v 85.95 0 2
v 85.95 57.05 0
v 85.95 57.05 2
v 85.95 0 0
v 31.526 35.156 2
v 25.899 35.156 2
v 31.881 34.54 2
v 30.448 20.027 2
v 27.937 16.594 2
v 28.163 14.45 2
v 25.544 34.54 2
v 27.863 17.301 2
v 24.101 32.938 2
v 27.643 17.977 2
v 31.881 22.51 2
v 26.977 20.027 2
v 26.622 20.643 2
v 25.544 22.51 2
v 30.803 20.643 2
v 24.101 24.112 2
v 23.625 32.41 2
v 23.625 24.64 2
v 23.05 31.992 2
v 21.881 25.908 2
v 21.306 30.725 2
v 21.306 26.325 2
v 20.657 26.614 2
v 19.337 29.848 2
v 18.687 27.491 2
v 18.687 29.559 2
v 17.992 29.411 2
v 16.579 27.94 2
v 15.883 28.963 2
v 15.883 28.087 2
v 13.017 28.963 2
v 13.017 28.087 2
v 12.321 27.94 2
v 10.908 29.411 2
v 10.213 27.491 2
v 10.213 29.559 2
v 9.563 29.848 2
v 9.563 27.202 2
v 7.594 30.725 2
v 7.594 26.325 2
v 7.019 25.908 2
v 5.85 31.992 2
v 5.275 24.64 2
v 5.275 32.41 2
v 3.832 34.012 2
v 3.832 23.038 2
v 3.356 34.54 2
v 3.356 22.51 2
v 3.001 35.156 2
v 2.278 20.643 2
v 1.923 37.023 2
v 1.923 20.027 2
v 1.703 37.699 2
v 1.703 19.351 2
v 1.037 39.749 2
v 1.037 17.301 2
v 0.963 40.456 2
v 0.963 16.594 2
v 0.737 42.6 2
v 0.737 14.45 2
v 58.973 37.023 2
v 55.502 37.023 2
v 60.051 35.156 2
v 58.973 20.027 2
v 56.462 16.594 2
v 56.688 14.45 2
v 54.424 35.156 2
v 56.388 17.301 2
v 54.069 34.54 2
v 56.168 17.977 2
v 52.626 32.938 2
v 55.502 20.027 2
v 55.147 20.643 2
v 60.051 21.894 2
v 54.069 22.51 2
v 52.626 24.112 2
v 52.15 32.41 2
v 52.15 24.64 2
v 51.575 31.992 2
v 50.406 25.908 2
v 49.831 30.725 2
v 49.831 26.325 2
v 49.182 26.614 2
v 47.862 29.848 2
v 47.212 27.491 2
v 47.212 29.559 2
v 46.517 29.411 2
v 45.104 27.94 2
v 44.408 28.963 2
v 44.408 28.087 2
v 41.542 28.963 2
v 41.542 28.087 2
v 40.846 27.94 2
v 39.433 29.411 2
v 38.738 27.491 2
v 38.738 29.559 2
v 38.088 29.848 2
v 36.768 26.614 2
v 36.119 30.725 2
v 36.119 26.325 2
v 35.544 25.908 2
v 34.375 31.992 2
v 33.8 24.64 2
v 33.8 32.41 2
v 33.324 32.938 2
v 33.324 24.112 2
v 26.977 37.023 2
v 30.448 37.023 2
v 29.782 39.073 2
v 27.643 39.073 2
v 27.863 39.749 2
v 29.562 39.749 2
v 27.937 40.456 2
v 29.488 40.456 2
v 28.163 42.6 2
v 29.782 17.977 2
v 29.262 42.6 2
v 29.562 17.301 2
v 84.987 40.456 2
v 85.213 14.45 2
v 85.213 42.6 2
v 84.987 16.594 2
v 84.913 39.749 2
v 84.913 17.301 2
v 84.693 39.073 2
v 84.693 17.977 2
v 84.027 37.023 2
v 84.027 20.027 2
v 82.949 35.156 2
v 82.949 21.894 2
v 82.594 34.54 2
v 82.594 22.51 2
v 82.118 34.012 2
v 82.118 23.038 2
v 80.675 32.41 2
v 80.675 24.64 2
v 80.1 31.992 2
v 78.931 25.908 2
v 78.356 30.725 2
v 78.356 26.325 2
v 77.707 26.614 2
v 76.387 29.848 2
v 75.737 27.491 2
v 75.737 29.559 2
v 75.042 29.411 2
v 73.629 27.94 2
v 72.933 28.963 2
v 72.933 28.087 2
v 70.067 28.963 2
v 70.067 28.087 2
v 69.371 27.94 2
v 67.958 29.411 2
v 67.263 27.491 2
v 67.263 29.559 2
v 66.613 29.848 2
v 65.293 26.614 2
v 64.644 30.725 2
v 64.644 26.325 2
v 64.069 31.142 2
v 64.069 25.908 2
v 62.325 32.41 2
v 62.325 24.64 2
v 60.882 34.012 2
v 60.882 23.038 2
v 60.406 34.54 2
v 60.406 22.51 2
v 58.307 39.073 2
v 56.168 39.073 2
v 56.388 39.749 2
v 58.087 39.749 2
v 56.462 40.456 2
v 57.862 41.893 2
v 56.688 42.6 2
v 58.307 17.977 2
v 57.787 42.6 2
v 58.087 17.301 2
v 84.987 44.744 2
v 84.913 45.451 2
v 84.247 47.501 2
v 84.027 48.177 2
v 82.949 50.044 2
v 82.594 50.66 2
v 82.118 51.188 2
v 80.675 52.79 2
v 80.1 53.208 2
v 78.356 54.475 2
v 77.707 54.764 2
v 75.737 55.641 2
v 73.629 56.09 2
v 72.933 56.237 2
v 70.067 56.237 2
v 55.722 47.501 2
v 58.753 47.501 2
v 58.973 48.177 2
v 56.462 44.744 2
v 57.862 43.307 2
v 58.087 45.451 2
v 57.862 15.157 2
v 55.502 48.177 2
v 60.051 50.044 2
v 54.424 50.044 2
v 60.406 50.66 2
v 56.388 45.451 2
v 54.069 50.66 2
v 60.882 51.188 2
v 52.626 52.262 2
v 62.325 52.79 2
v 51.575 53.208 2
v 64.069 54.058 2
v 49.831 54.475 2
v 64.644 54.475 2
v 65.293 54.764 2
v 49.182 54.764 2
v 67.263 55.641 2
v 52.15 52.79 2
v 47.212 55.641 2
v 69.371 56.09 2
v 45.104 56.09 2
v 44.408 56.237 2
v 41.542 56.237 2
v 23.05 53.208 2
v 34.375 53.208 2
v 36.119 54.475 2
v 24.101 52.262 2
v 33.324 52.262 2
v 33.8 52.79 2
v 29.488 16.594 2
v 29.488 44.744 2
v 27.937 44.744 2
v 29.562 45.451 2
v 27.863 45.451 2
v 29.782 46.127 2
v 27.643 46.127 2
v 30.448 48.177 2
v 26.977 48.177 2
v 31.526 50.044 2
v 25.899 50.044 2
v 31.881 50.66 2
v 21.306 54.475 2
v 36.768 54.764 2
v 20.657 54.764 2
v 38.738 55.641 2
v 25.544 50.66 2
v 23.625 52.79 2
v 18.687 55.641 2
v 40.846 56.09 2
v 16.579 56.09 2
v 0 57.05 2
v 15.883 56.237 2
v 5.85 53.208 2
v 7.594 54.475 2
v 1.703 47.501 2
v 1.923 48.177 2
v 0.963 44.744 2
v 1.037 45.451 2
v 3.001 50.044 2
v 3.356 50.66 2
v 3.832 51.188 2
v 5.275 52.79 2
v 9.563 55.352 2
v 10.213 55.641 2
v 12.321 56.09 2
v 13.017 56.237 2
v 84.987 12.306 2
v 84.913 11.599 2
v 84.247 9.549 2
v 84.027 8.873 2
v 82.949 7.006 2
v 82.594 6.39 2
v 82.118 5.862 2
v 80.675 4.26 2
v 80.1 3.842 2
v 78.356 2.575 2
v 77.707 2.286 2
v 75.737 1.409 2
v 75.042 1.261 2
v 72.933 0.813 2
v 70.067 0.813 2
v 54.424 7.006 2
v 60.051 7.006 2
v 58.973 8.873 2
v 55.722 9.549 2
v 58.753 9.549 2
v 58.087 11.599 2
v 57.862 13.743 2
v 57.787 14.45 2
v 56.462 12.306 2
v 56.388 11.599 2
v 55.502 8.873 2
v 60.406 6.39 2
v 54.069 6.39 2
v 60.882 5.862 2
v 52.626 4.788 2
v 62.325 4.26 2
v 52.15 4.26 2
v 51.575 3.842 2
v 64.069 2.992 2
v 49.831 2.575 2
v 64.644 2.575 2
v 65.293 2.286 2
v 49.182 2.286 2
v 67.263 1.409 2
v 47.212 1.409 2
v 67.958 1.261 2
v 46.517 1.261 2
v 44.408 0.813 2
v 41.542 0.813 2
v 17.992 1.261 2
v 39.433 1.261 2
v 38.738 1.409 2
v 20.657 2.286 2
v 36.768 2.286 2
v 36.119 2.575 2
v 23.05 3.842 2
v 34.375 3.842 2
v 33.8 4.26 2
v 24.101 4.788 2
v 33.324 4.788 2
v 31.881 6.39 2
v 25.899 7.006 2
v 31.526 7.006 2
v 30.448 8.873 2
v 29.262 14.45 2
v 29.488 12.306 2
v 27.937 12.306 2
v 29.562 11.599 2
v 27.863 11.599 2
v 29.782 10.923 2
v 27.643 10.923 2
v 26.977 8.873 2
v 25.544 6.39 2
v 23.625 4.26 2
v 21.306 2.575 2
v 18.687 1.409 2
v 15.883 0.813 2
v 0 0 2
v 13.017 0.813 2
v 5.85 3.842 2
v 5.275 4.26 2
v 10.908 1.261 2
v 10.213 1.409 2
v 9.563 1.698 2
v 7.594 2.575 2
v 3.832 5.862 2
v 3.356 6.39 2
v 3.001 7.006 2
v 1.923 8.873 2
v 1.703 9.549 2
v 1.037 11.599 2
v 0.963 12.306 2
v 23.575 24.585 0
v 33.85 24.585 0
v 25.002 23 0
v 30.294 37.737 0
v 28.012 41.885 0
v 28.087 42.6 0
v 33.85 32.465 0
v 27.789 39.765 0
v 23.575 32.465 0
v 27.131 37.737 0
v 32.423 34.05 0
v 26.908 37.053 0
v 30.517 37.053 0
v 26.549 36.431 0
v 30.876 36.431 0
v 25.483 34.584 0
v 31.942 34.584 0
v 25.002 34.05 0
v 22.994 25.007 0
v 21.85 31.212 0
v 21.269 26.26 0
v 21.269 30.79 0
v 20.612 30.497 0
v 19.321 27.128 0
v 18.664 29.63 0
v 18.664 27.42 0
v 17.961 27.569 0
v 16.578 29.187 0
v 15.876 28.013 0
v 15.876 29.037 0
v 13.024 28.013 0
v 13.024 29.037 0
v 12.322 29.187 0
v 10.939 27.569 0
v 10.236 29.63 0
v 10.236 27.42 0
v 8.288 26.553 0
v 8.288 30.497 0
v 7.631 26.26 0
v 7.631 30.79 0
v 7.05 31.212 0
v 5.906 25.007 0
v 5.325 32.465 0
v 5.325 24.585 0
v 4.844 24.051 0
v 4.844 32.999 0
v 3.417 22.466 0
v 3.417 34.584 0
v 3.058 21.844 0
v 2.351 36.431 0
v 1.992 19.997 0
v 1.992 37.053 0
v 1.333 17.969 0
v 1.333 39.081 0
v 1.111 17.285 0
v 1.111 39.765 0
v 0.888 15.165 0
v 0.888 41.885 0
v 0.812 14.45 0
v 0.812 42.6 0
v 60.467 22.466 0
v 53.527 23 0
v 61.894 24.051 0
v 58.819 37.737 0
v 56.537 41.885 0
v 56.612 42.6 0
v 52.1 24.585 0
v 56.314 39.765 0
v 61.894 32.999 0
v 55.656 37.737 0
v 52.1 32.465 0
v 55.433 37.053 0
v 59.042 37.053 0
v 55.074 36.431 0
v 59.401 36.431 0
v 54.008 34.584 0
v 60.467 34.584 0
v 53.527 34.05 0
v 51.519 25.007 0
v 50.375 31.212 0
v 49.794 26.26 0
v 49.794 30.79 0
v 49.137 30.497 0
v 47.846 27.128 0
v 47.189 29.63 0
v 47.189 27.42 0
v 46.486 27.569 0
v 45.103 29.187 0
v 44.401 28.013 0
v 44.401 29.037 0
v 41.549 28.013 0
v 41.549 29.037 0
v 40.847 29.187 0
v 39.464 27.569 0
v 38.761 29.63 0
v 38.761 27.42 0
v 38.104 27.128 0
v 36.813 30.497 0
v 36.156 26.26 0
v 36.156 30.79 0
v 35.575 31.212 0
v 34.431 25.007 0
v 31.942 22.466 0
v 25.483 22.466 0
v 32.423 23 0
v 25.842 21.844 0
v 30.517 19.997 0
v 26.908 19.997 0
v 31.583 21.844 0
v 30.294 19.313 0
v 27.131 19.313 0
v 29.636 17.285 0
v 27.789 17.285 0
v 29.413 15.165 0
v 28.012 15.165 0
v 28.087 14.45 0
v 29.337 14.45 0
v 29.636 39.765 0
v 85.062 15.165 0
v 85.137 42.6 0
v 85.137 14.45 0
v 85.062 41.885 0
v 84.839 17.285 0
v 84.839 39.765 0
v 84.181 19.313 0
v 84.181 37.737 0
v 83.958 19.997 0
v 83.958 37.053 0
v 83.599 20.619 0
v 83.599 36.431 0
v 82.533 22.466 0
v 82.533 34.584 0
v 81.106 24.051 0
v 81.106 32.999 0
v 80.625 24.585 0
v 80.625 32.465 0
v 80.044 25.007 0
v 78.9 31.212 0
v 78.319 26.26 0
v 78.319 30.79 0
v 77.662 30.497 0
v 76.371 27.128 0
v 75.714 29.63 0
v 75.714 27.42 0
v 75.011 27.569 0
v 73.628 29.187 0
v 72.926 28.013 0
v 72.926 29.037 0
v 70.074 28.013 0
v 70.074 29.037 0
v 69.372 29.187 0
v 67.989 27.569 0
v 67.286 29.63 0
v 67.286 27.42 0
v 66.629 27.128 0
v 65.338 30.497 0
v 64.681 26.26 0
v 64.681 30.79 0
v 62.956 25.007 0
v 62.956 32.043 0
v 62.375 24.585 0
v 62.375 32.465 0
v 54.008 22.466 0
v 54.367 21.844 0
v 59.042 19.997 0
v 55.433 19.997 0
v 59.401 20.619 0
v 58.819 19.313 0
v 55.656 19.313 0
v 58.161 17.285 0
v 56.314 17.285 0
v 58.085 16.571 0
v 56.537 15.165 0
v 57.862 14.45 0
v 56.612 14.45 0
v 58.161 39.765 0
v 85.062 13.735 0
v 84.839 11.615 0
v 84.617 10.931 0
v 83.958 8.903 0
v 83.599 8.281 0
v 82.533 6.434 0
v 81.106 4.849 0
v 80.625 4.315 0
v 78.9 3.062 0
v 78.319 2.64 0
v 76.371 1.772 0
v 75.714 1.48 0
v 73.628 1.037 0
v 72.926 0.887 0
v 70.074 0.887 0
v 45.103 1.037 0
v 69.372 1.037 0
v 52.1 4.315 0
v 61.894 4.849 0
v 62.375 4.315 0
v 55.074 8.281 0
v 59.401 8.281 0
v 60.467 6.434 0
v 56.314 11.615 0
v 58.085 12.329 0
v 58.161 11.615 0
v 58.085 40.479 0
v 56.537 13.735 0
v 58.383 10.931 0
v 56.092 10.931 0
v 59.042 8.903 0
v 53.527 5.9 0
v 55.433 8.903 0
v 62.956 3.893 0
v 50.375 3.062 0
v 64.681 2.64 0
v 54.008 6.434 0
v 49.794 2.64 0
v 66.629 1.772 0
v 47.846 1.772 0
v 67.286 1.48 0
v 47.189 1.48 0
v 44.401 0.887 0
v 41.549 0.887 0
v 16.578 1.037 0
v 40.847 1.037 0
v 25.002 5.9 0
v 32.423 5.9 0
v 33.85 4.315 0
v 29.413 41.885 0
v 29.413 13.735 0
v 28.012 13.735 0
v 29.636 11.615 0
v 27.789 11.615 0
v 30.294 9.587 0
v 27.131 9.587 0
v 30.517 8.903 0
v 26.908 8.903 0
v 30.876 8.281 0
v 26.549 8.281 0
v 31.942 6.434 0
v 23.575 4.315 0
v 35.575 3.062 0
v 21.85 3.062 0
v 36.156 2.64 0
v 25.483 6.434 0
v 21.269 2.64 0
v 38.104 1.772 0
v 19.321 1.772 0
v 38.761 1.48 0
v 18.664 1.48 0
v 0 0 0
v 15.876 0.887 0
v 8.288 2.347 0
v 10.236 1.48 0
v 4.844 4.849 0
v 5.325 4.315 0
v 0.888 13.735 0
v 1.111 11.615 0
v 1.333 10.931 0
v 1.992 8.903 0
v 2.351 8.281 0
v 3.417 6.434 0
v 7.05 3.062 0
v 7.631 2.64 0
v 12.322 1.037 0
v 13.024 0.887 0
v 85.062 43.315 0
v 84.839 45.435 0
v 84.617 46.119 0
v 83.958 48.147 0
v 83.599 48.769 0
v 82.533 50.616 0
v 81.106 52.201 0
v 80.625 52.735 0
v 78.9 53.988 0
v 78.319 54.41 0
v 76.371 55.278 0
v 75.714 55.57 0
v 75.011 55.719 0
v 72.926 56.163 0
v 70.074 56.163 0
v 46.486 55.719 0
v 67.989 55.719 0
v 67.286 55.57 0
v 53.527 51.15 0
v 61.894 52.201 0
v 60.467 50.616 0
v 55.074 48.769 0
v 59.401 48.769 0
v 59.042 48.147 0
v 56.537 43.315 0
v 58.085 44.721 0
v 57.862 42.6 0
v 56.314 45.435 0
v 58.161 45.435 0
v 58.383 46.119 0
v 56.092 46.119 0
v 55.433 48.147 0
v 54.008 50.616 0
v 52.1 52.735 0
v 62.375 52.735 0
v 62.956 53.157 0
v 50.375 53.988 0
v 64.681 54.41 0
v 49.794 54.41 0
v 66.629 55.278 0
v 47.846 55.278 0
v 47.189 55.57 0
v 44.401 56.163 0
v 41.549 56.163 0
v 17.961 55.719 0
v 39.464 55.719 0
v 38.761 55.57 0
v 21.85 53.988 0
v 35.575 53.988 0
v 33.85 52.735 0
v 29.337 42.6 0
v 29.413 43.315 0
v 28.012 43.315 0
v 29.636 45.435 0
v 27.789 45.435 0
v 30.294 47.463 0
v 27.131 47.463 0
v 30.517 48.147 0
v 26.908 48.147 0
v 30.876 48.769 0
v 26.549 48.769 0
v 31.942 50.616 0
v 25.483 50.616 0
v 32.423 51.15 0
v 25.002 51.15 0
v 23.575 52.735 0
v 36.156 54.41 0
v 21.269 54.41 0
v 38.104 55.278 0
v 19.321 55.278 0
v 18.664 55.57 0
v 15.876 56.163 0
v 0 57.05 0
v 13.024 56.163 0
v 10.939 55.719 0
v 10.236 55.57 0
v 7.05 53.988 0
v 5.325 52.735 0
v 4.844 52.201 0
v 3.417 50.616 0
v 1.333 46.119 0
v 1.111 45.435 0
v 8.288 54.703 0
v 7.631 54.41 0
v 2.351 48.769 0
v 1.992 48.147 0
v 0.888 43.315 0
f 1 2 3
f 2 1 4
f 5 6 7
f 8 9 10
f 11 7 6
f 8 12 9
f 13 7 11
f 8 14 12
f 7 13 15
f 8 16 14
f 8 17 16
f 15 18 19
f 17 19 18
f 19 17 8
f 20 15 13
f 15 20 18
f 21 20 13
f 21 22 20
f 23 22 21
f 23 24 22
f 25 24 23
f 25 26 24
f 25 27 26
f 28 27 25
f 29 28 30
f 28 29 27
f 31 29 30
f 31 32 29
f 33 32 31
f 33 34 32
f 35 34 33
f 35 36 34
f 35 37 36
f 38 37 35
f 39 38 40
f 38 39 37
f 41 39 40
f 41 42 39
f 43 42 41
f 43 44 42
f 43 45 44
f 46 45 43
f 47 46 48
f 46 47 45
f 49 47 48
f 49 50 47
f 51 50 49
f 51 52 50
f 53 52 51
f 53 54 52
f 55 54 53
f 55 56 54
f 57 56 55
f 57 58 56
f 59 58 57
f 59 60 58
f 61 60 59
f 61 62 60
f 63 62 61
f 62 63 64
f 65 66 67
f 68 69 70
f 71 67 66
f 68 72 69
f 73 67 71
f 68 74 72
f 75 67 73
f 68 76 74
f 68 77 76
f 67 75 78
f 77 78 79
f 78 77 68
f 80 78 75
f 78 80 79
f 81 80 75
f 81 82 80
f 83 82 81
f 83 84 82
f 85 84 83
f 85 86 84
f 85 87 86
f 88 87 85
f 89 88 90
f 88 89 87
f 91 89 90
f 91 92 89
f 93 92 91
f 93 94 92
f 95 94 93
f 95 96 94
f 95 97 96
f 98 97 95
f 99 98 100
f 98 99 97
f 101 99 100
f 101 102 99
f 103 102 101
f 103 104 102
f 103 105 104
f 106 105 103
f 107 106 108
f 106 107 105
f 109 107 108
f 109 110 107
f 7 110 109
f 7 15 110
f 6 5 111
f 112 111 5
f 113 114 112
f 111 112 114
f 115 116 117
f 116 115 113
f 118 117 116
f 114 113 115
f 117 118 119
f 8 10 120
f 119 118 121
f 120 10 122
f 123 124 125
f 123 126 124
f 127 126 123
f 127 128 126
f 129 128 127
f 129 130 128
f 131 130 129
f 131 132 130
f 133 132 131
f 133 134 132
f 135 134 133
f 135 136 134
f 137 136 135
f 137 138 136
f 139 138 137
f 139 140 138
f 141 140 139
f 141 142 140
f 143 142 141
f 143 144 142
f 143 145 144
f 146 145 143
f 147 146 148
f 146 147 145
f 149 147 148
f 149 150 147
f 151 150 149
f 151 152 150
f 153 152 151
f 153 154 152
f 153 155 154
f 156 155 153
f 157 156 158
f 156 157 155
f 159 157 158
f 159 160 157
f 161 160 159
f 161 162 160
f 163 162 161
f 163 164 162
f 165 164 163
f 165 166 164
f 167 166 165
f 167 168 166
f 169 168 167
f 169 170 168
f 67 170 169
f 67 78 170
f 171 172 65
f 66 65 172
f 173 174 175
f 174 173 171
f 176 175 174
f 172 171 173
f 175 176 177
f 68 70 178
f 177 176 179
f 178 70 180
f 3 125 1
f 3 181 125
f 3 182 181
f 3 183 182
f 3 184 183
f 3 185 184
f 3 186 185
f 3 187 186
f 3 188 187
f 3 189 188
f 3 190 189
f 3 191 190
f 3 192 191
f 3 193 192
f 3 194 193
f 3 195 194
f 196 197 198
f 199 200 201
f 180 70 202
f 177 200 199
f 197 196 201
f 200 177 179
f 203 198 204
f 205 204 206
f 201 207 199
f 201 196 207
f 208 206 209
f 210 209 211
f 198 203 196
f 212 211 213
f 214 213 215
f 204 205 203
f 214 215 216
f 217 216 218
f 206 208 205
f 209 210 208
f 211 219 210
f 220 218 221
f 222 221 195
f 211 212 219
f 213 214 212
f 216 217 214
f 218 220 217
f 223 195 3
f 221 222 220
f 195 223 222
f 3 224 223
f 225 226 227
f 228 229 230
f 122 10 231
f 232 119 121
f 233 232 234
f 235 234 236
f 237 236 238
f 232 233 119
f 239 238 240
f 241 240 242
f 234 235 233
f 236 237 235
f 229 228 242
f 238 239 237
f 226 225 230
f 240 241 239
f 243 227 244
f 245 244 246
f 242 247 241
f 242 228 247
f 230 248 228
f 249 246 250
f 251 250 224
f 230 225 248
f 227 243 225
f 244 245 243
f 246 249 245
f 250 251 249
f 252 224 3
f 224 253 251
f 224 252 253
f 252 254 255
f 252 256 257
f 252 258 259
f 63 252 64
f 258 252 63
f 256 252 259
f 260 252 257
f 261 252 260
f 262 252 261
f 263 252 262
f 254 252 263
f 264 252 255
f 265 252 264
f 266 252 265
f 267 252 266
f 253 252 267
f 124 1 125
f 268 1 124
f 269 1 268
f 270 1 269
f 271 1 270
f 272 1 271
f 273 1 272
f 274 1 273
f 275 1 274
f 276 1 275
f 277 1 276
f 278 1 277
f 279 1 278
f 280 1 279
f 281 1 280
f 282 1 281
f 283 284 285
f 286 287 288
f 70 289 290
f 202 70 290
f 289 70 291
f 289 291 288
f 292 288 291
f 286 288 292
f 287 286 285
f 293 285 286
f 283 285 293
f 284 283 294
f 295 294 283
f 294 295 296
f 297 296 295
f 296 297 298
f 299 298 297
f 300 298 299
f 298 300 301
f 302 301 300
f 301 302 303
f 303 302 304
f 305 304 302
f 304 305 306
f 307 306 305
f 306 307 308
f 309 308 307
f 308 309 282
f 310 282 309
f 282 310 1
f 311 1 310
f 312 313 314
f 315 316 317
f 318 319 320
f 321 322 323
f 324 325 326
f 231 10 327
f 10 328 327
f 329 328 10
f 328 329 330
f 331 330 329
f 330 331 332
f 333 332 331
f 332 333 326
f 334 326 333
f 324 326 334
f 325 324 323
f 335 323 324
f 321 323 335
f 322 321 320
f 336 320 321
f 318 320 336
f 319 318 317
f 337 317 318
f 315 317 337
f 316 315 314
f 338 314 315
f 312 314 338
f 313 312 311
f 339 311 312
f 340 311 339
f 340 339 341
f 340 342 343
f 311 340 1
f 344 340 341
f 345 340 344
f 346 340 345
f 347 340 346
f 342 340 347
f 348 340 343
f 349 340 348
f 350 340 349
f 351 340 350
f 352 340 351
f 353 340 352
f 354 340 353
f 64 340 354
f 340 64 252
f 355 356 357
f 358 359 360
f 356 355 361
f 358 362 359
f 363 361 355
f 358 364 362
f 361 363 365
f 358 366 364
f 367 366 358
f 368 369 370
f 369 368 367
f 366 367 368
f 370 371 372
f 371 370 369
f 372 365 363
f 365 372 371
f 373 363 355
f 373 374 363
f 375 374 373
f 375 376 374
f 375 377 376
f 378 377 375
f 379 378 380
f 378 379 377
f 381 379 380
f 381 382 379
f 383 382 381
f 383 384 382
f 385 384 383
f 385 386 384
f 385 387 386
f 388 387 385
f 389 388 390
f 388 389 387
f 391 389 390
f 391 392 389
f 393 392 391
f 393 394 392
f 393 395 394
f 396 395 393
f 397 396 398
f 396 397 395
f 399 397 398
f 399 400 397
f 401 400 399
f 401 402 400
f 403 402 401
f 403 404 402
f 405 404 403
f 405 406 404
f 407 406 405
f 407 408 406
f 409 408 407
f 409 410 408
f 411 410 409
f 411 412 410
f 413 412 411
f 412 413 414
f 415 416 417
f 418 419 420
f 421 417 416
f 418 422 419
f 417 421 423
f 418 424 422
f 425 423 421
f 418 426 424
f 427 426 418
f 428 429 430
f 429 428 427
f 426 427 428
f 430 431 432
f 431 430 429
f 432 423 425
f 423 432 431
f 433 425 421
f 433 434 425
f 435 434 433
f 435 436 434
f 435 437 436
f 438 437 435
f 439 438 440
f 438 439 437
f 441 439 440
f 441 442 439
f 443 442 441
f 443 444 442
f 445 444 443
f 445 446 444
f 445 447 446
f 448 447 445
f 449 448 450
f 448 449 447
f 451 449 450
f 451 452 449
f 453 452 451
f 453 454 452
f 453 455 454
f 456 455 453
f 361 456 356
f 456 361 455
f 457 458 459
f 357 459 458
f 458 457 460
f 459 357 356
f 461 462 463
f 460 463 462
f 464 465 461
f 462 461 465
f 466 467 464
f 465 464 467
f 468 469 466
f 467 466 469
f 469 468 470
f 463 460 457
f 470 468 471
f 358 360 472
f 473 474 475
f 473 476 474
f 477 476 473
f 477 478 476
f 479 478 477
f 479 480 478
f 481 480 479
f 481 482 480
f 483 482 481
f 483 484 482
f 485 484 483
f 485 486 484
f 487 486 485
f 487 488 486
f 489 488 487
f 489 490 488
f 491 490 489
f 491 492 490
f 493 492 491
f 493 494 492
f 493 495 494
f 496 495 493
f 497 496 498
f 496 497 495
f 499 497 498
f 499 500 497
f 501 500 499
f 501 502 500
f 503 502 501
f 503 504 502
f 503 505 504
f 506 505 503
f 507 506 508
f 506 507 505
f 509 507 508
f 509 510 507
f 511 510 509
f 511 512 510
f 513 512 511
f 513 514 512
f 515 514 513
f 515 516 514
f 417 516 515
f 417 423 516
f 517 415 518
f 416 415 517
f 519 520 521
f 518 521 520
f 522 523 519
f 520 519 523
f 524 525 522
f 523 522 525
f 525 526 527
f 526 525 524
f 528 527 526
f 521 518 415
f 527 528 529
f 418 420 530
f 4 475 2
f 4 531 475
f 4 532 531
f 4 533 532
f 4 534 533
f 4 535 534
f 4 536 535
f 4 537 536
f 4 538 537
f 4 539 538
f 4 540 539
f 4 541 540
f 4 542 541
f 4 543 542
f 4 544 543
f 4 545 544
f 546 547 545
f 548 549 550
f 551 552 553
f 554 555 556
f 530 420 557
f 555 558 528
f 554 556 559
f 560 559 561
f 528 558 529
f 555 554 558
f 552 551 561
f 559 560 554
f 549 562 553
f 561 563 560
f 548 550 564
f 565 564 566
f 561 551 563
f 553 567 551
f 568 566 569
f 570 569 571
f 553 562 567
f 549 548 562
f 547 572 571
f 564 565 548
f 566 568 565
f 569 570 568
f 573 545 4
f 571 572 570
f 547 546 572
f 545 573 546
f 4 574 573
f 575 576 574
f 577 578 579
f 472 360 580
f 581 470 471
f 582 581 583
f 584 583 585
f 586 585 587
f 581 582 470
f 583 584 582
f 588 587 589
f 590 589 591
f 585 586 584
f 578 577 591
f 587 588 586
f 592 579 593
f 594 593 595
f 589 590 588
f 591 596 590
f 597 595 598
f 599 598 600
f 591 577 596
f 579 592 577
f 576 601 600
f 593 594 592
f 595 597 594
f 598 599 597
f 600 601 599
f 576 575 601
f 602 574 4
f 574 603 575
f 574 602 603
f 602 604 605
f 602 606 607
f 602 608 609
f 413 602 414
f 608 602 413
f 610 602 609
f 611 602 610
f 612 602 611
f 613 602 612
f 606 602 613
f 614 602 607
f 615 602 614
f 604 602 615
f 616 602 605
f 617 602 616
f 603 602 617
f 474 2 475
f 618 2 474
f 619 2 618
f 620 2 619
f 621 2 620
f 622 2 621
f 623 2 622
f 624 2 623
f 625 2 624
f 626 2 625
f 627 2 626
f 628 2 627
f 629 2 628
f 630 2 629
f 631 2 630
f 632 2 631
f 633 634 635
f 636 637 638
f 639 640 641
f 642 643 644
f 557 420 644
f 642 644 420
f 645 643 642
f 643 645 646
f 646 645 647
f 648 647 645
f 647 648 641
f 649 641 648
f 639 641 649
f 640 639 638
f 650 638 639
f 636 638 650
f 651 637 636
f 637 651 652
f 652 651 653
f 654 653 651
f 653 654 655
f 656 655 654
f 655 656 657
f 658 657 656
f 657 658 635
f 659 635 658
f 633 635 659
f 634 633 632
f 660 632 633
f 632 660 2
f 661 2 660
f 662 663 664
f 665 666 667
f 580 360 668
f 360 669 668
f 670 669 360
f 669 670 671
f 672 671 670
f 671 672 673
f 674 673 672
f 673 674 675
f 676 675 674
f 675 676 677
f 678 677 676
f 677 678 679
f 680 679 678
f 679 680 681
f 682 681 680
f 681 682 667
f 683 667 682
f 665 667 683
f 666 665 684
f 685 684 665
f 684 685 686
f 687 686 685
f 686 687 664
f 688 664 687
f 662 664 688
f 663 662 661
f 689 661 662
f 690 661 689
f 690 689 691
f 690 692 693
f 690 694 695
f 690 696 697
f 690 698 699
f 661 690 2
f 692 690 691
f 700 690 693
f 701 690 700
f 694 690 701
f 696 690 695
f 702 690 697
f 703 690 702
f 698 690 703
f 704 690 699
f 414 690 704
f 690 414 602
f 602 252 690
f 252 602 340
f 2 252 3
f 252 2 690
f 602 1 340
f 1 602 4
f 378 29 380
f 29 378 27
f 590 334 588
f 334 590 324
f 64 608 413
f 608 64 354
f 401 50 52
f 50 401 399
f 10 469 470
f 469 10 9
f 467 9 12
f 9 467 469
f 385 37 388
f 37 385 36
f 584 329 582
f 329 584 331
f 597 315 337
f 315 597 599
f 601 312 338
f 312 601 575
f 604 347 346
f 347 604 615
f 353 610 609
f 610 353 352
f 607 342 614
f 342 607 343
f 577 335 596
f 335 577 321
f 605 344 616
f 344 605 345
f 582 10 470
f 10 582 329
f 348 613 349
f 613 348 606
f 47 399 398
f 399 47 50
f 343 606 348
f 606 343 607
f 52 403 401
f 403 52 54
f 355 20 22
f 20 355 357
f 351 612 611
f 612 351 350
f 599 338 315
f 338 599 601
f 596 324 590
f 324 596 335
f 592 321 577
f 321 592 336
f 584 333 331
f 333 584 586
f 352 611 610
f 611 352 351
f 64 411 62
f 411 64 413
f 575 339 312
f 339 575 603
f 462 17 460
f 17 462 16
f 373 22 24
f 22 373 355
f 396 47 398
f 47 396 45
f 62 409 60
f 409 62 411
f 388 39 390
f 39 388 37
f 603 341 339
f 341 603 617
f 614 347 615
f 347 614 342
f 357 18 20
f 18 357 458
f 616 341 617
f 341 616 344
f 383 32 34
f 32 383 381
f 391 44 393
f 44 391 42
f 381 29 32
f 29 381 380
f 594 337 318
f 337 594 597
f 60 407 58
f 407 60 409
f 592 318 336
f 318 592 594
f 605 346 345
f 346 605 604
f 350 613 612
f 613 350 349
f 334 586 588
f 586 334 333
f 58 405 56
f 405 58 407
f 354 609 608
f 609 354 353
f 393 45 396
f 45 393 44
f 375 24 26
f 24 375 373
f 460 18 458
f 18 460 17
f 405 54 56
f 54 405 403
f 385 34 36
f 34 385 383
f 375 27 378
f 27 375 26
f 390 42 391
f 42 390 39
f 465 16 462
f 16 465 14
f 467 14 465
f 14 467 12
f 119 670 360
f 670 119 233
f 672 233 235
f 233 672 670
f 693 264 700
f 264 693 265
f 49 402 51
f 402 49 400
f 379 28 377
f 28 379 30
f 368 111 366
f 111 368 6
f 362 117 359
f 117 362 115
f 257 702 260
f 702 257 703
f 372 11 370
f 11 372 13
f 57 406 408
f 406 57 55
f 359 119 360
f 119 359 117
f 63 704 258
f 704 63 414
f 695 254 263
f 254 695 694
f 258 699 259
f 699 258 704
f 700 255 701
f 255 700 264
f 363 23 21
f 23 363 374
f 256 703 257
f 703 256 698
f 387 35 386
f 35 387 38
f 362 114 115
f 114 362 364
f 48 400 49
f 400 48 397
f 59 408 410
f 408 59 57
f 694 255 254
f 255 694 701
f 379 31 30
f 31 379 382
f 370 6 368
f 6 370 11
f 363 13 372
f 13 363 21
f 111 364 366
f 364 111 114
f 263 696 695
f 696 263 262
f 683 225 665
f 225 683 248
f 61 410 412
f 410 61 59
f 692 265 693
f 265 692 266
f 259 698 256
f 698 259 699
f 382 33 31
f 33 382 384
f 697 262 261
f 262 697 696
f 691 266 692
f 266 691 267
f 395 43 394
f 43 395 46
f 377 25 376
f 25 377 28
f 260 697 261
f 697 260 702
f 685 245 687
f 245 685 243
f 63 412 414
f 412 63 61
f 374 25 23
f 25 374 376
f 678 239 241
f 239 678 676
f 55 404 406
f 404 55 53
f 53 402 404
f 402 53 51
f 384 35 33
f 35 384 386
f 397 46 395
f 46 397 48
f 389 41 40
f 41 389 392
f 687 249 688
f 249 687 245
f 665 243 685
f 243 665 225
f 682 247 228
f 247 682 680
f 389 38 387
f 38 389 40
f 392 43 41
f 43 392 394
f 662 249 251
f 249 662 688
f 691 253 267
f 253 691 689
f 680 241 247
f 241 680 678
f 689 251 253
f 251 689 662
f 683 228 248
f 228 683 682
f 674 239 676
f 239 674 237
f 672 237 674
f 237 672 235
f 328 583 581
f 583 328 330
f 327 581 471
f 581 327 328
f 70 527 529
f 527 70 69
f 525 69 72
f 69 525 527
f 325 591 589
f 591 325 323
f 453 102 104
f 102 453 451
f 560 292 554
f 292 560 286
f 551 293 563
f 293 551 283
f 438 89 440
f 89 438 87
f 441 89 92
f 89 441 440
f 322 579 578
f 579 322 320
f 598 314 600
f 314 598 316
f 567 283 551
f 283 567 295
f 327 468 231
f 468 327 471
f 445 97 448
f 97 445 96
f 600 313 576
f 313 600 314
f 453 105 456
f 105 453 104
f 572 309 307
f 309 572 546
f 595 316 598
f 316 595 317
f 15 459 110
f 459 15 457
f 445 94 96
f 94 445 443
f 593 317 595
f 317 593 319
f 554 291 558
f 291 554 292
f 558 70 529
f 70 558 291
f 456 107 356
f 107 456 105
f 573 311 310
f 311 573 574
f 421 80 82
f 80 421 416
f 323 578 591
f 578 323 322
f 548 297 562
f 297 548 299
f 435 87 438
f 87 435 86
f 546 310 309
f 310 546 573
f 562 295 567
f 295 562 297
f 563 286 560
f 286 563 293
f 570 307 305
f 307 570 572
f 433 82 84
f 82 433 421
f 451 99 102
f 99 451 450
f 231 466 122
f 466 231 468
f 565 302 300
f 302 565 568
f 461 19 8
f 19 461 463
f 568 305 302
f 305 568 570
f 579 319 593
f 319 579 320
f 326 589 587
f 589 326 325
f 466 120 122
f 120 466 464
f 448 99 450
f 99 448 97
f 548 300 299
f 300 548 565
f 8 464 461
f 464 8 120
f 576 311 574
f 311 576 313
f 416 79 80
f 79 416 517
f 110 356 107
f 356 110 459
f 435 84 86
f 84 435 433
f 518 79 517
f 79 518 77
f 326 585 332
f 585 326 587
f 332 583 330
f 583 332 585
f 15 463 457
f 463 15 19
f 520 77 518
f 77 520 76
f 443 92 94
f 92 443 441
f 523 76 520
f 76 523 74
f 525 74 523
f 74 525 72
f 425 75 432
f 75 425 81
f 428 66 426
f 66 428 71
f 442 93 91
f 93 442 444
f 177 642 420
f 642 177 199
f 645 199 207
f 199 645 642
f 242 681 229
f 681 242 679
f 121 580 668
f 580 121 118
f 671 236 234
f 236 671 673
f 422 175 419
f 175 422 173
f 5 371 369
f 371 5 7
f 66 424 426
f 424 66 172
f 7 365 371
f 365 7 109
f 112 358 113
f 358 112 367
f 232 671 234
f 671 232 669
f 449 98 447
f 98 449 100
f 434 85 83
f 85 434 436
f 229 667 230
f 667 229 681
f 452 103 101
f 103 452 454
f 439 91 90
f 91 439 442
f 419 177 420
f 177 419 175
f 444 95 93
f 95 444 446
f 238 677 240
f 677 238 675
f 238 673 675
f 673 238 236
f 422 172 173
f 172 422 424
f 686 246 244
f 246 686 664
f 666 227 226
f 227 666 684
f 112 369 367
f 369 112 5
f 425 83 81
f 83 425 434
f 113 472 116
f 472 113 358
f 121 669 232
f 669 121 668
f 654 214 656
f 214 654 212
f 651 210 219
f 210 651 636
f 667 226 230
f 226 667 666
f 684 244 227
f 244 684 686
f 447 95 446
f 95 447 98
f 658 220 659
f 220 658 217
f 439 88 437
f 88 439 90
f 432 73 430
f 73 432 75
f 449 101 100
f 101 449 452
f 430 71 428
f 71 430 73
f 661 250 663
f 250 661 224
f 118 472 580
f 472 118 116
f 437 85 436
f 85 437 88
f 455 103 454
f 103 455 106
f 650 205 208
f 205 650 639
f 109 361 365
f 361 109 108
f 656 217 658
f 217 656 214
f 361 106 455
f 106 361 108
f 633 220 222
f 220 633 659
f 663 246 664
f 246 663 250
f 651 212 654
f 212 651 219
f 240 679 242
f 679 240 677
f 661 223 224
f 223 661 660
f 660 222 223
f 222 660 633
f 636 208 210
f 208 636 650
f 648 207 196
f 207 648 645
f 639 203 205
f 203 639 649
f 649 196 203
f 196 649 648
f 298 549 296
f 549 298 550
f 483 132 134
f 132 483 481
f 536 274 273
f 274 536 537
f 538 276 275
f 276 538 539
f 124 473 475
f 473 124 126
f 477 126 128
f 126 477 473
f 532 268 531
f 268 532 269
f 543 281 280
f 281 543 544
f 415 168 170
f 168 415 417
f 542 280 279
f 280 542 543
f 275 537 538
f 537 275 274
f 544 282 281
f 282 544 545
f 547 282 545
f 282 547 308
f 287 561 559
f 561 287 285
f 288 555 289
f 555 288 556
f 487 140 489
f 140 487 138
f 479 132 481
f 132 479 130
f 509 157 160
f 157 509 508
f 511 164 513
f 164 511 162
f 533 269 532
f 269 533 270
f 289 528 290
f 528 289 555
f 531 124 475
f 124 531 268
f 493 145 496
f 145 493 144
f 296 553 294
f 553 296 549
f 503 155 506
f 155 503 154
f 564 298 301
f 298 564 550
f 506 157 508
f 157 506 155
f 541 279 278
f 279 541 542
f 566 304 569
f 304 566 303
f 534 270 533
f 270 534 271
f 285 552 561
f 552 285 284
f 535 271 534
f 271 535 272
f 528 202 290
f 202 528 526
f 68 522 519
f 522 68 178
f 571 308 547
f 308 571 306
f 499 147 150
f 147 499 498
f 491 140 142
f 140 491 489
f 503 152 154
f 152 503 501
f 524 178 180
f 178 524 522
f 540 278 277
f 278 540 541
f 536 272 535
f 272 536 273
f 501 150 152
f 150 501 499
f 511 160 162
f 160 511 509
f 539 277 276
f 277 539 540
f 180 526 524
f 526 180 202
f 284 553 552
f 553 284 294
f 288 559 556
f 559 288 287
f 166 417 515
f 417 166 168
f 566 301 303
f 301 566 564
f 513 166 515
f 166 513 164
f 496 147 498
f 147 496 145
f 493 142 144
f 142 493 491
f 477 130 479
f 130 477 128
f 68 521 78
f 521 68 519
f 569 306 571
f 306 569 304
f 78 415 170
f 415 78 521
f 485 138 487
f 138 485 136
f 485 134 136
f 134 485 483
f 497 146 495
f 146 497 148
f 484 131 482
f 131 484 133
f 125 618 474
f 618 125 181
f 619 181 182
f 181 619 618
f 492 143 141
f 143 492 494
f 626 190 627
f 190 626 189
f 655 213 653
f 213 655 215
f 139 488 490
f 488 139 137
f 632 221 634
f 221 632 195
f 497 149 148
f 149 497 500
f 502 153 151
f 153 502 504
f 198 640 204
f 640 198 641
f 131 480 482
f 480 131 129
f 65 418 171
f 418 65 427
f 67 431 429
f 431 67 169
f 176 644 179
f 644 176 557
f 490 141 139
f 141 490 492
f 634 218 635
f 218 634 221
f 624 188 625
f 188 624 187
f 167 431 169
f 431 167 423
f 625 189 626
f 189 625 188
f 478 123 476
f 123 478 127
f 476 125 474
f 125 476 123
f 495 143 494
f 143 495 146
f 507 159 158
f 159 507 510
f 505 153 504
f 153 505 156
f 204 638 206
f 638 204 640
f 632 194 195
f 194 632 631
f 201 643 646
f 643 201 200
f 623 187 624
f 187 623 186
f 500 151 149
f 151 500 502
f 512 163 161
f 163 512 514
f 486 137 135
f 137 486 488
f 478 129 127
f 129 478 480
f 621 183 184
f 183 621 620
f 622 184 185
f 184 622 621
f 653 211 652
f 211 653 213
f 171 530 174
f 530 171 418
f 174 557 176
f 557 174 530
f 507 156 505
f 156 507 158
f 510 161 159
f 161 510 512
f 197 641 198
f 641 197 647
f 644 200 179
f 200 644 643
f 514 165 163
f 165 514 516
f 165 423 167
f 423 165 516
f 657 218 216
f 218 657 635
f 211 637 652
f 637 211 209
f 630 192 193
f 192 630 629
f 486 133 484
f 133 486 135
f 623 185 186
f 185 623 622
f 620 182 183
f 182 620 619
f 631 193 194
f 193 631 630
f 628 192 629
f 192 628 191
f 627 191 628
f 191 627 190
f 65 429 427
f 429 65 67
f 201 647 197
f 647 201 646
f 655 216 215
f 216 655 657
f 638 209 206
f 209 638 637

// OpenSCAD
coin_d	=	26.4 + 1;
coin_r	=	coin_d / 2;
coin_h	=	2;

buffer	=	0.75;

card_w	=	(3 * coin_d) + (5 * buffer);	//86
card_l	=	(2 * coin_d) + (3 * buffer);	//56
card_h	=	coin_h;	//2

difference() {
	cube([card_w, card_l, card_h]);

	translate([coin_r+buffer, coin_r+buffer, -1]){
		cylinder(r1=coin_r-0.1, r2=coin_r+0.05, h=4);
	}
	translate([coin_r+buffer, card_l-coin_r-buffer, -1]){
		cylinder(r1=coin_r-0.1, r2=coin_r+0.05, h=4);
	}

	translate([card_w/2, coin_r+buffer, -1]){
		cylinder(r1=coin_r-0.1, r2=coin_r+0.05, h=4);
	}
	translate([card_w/2, card_l-coin_r-buffer, -1]){
		cylinder(r1=coin_r-0.1, r2=coin_r+0.05, h=4);
	}

	translate([card_w-coin_r-buffer, coin_r+buffer, -1]){
		cylinder(r1=coin_r-0.1, r2=coin_r+0.05, h=4);
	}
	translate([card_w-coin_r-buffer, card_l-coin_r-buffer, -1]){
		cylinder(r1=coin_r-0.1, r2=coin_r+0.05, h=4);
	}
}
